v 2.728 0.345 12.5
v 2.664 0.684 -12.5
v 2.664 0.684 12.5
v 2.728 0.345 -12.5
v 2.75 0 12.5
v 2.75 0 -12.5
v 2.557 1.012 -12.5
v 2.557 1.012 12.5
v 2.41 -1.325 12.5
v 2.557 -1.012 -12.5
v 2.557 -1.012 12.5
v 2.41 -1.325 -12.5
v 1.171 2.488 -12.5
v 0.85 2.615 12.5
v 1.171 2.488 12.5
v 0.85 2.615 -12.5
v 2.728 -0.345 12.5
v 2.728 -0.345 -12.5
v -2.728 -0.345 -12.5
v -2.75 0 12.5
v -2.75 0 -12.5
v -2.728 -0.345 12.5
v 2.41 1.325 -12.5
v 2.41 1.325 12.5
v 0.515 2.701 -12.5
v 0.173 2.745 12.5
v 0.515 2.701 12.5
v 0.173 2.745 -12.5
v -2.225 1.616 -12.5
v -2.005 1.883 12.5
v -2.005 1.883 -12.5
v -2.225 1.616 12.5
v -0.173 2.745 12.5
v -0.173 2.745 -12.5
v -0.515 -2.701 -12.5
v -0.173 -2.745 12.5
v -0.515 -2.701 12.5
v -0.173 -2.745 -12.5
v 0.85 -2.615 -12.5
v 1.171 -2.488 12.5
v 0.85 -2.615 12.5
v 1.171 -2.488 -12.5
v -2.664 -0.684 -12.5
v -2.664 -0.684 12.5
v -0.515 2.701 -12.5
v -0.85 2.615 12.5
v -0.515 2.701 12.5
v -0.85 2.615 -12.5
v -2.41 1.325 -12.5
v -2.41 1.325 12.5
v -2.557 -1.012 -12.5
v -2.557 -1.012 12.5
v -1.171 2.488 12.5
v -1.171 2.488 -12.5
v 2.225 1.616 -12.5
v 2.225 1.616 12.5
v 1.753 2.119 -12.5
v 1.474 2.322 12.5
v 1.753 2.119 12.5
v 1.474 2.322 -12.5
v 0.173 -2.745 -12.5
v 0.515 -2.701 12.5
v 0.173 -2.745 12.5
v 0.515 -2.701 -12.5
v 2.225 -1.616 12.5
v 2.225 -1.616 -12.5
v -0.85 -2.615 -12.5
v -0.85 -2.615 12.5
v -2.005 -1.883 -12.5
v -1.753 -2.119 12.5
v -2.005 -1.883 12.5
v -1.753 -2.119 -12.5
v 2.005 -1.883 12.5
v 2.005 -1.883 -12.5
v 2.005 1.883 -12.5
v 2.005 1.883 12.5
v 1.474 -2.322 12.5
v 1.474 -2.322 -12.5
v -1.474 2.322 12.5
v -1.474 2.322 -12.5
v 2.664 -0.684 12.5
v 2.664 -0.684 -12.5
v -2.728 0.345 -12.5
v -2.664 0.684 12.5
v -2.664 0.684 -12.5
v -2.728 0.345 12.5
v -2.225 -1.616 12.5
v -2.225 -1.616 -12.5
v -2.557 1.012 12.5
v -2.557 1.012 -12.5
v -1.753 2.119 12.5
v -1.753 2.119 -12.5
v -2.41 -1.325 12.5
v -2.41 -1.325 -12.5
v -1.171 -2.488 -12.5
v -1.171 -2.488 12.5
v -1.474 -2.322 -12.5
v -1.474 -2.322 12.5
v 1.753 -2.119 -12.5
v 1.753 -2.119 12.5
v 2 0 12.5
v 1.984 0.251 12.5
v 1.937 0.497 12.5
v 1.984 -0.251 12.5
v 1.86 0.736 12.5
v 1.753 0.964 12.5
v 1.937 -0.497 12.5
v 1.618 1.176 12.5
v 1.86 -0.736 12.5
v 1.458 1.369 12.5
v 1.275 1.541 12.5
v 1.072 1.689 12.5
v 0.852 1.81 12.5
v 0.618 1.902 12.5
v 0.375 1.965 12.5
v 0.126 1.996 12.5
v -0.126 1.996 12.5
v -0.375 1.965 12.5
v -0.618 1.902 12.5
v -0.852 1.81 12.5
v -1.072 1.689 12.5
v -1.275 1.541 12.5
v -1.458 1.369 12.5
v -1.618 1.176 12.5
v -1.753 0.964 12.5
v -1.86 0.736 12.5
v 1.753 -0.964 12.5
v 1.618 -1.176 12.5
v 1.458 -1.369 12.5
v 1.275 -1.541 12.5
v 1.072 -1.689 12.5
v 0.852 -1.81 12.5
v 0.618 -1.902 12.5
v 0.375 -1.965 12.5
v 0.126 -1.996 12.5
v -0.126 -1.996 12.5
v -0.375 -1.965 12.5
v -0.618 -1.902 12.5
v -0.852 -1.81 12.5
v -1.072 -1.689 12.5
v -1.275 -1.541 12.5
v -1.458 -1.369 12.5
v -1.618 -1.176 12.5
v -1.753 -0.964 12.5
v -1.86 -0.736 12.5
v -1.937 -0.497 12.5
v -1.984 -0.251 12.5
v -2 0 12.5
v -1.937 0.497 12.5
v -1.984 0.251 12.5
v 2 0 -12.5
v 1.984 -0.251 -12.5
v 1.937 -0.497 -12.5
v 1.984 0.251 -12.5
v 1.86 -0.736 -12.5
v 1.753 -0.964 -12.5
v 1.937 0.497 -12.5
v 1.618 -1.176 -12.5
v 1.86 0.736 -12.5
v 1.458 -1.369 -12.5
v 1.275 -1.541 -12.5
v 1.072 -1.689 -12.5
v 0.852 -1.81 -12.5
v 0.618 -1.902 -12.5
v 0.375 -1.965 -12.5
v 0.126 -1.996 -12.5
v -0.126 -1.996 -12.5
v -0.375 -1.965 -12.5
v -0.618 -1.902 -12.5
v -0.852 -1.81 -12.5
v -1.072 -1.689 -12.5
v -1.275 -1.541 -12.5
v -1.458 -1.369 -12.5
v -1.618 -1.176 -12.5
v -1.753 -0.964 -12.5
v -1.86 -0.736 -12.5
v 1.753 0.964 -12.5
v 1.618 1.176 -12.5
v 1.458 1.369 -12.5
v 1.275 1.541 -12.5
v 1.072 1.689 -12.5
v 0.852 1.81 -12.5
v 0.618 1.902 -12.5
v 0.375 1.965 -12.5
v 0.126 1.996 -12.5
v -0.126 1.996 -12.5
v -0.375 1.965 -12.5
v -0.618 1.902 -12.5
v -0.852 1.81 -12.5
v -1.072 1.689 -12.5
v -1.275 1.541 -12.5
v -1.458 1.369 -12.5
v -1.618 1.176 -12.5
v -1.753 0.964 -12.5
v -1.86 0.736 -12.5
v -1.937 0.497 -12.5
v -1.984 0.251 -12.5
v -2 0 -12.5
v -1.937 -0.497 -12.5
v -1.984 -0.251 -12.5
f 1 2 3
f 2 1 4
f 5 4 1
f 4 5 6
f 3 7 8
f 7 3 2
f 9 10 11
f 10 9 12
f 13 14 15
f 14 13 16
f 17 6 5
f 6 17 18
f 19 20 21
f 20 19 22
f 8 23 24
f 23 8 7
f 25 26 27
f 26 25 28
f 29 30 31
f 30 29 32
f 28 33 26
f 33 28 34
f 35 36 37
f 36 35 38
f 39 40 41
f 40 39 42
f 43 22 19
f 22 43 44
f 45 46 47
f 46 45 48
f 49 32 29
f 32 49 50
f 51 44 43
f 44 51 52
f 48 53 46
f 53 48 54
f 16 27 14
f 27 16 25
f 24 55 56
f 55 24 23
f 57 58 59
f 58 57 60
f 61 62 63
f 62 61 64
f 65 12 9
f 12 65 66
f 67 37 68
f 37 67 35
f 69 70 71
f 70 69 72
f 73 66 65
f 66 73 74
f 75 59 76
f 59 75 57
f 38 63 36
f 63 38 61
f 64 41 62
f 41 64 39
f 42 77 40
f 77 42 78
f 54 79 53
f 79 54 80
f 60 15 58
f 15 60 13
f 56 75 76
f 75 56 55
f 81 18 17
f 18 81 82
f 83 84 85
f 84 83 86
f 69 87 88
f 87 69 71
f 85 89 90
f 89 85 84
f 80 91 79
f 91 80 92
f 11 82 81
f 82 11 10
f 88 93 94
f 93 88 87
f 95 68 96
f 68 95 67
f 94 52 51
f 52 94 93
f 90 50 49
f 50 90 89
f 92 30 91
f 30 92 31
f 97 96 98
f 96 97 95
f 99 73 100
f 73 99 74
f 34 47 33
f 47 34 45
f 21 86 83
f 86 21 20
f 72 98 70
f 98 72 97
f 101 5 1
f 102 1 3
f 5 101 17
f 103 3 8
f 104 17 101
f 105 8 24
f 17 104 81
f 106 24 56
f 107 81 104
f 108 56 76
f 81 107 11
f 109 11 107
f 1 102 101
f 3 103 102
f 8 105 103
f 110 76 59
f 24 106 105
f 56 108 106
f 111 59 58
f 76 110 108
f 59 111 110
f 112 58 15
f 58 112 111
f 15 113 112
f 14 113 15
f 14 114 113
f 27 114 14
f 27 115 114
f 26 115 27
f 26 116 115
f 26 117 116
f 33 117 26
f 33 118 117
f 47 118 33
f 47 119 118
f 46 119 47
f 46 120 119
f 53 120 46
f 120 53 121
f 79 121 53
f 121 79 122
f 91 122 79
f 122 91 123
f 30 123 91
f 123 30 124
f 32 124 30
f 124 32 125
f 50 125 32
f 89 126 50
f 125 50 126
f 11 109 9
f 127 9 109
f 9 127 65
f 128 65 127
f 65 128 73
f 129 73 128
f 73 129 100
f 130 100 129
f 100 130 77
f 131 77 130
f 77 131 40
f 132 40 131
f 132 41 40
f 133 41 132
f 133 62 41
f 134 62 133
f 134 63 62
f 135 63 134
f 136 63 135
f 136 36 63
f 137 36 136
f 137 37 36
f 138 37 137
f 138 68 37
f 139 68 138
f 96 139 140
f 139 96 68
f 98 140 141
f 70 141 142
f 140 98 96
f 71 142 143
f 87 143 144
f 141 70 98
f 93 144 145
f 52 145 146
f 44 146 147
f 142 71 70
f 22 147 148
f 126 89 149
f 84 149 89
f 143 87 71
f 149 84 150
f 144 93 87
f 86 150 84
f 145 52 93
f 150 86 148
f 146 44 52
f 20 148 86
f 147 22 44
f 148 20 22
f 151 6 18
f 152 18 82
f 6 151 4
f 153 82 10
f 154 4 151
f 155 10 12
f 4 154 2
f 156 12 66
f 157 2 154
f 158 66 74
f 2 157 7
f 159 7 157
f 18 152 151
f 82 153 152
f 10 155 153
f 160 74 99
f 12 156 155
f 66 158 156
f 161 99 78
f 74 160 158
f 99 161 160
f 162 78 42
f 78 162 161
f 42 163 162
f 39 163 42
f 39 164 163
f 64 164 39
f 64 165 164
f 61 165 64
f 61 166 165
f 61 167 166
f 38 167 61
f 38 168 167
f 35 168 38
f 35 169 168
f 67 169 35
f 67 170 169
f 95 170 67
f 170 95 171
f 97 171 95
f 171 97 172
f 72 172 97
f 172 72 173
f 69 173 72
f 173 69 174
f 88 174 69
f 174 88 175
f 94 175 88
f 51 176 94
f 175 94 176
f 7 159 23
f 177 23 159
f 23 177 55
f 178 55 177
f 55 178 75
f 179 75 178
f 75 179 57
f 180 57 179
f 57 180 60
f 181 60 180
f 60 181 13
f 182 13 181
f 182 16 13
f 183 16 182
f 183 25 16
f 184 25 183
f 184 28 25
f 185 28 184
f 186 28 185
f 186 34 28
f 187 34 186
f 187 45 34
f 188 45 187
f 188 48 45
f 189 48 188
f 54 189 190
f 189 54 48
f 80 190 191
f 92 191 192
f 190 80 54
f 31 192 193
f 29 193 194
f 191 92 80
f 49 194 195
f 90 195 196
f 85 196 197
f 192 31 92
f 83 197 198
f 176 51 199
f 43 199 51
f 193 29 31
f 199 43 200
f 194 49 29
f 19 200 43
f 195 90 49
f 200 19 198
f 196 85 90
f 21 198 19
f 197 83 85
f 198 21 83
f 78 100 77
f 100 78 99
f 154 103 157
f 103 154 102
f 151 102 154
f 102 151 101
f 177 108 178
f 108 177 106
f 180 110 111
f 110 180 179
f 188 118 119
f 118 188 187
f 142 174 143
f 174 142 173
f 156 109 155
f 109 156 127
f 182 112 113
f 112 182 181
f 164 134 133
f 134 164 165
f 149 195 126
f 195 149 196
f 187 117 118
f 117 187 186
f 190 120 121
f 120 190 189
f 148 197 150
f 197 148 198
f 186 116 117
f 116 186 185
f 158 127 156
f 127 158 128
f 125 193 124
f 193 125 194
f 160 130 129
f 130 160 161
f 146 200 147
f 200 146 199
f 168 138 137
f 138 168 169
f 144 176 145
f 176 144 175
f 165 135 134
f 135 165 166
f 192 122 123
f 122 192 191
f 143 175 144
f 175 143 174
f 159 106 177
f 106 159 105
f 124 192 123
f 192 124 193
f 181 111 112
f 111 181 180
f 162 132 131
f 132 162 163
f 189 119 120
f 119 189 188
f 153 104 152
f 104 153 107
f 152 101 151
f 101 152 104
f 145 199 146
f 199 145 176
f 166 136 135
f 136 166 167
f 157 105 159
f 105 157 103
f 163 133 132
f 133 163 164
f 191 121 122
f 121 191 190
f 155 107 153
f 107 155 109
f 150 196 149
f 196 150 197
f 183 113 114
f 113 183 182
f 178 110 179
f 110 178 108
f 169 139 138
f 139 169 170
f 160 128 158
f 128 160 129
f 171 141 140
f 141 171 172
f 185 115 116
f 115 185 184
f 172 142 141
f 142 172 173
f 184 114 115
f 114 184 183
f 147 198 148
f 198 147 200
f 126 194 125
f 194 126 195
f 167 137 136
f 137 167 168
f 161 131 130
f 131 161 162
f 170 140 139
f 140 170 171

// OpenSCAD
$fn = 50;


difference() {
	union() {
		translate(v = [0, 0, -12.5000000000]) {
			cylinder(h = 25, r = 2.7500000000);
		}
	}
	union() {
		translate(v = [0, 0, -100.0000000000]) {
			cylinder(h = 200, r = 2.0000000000);
		}
	}
}
